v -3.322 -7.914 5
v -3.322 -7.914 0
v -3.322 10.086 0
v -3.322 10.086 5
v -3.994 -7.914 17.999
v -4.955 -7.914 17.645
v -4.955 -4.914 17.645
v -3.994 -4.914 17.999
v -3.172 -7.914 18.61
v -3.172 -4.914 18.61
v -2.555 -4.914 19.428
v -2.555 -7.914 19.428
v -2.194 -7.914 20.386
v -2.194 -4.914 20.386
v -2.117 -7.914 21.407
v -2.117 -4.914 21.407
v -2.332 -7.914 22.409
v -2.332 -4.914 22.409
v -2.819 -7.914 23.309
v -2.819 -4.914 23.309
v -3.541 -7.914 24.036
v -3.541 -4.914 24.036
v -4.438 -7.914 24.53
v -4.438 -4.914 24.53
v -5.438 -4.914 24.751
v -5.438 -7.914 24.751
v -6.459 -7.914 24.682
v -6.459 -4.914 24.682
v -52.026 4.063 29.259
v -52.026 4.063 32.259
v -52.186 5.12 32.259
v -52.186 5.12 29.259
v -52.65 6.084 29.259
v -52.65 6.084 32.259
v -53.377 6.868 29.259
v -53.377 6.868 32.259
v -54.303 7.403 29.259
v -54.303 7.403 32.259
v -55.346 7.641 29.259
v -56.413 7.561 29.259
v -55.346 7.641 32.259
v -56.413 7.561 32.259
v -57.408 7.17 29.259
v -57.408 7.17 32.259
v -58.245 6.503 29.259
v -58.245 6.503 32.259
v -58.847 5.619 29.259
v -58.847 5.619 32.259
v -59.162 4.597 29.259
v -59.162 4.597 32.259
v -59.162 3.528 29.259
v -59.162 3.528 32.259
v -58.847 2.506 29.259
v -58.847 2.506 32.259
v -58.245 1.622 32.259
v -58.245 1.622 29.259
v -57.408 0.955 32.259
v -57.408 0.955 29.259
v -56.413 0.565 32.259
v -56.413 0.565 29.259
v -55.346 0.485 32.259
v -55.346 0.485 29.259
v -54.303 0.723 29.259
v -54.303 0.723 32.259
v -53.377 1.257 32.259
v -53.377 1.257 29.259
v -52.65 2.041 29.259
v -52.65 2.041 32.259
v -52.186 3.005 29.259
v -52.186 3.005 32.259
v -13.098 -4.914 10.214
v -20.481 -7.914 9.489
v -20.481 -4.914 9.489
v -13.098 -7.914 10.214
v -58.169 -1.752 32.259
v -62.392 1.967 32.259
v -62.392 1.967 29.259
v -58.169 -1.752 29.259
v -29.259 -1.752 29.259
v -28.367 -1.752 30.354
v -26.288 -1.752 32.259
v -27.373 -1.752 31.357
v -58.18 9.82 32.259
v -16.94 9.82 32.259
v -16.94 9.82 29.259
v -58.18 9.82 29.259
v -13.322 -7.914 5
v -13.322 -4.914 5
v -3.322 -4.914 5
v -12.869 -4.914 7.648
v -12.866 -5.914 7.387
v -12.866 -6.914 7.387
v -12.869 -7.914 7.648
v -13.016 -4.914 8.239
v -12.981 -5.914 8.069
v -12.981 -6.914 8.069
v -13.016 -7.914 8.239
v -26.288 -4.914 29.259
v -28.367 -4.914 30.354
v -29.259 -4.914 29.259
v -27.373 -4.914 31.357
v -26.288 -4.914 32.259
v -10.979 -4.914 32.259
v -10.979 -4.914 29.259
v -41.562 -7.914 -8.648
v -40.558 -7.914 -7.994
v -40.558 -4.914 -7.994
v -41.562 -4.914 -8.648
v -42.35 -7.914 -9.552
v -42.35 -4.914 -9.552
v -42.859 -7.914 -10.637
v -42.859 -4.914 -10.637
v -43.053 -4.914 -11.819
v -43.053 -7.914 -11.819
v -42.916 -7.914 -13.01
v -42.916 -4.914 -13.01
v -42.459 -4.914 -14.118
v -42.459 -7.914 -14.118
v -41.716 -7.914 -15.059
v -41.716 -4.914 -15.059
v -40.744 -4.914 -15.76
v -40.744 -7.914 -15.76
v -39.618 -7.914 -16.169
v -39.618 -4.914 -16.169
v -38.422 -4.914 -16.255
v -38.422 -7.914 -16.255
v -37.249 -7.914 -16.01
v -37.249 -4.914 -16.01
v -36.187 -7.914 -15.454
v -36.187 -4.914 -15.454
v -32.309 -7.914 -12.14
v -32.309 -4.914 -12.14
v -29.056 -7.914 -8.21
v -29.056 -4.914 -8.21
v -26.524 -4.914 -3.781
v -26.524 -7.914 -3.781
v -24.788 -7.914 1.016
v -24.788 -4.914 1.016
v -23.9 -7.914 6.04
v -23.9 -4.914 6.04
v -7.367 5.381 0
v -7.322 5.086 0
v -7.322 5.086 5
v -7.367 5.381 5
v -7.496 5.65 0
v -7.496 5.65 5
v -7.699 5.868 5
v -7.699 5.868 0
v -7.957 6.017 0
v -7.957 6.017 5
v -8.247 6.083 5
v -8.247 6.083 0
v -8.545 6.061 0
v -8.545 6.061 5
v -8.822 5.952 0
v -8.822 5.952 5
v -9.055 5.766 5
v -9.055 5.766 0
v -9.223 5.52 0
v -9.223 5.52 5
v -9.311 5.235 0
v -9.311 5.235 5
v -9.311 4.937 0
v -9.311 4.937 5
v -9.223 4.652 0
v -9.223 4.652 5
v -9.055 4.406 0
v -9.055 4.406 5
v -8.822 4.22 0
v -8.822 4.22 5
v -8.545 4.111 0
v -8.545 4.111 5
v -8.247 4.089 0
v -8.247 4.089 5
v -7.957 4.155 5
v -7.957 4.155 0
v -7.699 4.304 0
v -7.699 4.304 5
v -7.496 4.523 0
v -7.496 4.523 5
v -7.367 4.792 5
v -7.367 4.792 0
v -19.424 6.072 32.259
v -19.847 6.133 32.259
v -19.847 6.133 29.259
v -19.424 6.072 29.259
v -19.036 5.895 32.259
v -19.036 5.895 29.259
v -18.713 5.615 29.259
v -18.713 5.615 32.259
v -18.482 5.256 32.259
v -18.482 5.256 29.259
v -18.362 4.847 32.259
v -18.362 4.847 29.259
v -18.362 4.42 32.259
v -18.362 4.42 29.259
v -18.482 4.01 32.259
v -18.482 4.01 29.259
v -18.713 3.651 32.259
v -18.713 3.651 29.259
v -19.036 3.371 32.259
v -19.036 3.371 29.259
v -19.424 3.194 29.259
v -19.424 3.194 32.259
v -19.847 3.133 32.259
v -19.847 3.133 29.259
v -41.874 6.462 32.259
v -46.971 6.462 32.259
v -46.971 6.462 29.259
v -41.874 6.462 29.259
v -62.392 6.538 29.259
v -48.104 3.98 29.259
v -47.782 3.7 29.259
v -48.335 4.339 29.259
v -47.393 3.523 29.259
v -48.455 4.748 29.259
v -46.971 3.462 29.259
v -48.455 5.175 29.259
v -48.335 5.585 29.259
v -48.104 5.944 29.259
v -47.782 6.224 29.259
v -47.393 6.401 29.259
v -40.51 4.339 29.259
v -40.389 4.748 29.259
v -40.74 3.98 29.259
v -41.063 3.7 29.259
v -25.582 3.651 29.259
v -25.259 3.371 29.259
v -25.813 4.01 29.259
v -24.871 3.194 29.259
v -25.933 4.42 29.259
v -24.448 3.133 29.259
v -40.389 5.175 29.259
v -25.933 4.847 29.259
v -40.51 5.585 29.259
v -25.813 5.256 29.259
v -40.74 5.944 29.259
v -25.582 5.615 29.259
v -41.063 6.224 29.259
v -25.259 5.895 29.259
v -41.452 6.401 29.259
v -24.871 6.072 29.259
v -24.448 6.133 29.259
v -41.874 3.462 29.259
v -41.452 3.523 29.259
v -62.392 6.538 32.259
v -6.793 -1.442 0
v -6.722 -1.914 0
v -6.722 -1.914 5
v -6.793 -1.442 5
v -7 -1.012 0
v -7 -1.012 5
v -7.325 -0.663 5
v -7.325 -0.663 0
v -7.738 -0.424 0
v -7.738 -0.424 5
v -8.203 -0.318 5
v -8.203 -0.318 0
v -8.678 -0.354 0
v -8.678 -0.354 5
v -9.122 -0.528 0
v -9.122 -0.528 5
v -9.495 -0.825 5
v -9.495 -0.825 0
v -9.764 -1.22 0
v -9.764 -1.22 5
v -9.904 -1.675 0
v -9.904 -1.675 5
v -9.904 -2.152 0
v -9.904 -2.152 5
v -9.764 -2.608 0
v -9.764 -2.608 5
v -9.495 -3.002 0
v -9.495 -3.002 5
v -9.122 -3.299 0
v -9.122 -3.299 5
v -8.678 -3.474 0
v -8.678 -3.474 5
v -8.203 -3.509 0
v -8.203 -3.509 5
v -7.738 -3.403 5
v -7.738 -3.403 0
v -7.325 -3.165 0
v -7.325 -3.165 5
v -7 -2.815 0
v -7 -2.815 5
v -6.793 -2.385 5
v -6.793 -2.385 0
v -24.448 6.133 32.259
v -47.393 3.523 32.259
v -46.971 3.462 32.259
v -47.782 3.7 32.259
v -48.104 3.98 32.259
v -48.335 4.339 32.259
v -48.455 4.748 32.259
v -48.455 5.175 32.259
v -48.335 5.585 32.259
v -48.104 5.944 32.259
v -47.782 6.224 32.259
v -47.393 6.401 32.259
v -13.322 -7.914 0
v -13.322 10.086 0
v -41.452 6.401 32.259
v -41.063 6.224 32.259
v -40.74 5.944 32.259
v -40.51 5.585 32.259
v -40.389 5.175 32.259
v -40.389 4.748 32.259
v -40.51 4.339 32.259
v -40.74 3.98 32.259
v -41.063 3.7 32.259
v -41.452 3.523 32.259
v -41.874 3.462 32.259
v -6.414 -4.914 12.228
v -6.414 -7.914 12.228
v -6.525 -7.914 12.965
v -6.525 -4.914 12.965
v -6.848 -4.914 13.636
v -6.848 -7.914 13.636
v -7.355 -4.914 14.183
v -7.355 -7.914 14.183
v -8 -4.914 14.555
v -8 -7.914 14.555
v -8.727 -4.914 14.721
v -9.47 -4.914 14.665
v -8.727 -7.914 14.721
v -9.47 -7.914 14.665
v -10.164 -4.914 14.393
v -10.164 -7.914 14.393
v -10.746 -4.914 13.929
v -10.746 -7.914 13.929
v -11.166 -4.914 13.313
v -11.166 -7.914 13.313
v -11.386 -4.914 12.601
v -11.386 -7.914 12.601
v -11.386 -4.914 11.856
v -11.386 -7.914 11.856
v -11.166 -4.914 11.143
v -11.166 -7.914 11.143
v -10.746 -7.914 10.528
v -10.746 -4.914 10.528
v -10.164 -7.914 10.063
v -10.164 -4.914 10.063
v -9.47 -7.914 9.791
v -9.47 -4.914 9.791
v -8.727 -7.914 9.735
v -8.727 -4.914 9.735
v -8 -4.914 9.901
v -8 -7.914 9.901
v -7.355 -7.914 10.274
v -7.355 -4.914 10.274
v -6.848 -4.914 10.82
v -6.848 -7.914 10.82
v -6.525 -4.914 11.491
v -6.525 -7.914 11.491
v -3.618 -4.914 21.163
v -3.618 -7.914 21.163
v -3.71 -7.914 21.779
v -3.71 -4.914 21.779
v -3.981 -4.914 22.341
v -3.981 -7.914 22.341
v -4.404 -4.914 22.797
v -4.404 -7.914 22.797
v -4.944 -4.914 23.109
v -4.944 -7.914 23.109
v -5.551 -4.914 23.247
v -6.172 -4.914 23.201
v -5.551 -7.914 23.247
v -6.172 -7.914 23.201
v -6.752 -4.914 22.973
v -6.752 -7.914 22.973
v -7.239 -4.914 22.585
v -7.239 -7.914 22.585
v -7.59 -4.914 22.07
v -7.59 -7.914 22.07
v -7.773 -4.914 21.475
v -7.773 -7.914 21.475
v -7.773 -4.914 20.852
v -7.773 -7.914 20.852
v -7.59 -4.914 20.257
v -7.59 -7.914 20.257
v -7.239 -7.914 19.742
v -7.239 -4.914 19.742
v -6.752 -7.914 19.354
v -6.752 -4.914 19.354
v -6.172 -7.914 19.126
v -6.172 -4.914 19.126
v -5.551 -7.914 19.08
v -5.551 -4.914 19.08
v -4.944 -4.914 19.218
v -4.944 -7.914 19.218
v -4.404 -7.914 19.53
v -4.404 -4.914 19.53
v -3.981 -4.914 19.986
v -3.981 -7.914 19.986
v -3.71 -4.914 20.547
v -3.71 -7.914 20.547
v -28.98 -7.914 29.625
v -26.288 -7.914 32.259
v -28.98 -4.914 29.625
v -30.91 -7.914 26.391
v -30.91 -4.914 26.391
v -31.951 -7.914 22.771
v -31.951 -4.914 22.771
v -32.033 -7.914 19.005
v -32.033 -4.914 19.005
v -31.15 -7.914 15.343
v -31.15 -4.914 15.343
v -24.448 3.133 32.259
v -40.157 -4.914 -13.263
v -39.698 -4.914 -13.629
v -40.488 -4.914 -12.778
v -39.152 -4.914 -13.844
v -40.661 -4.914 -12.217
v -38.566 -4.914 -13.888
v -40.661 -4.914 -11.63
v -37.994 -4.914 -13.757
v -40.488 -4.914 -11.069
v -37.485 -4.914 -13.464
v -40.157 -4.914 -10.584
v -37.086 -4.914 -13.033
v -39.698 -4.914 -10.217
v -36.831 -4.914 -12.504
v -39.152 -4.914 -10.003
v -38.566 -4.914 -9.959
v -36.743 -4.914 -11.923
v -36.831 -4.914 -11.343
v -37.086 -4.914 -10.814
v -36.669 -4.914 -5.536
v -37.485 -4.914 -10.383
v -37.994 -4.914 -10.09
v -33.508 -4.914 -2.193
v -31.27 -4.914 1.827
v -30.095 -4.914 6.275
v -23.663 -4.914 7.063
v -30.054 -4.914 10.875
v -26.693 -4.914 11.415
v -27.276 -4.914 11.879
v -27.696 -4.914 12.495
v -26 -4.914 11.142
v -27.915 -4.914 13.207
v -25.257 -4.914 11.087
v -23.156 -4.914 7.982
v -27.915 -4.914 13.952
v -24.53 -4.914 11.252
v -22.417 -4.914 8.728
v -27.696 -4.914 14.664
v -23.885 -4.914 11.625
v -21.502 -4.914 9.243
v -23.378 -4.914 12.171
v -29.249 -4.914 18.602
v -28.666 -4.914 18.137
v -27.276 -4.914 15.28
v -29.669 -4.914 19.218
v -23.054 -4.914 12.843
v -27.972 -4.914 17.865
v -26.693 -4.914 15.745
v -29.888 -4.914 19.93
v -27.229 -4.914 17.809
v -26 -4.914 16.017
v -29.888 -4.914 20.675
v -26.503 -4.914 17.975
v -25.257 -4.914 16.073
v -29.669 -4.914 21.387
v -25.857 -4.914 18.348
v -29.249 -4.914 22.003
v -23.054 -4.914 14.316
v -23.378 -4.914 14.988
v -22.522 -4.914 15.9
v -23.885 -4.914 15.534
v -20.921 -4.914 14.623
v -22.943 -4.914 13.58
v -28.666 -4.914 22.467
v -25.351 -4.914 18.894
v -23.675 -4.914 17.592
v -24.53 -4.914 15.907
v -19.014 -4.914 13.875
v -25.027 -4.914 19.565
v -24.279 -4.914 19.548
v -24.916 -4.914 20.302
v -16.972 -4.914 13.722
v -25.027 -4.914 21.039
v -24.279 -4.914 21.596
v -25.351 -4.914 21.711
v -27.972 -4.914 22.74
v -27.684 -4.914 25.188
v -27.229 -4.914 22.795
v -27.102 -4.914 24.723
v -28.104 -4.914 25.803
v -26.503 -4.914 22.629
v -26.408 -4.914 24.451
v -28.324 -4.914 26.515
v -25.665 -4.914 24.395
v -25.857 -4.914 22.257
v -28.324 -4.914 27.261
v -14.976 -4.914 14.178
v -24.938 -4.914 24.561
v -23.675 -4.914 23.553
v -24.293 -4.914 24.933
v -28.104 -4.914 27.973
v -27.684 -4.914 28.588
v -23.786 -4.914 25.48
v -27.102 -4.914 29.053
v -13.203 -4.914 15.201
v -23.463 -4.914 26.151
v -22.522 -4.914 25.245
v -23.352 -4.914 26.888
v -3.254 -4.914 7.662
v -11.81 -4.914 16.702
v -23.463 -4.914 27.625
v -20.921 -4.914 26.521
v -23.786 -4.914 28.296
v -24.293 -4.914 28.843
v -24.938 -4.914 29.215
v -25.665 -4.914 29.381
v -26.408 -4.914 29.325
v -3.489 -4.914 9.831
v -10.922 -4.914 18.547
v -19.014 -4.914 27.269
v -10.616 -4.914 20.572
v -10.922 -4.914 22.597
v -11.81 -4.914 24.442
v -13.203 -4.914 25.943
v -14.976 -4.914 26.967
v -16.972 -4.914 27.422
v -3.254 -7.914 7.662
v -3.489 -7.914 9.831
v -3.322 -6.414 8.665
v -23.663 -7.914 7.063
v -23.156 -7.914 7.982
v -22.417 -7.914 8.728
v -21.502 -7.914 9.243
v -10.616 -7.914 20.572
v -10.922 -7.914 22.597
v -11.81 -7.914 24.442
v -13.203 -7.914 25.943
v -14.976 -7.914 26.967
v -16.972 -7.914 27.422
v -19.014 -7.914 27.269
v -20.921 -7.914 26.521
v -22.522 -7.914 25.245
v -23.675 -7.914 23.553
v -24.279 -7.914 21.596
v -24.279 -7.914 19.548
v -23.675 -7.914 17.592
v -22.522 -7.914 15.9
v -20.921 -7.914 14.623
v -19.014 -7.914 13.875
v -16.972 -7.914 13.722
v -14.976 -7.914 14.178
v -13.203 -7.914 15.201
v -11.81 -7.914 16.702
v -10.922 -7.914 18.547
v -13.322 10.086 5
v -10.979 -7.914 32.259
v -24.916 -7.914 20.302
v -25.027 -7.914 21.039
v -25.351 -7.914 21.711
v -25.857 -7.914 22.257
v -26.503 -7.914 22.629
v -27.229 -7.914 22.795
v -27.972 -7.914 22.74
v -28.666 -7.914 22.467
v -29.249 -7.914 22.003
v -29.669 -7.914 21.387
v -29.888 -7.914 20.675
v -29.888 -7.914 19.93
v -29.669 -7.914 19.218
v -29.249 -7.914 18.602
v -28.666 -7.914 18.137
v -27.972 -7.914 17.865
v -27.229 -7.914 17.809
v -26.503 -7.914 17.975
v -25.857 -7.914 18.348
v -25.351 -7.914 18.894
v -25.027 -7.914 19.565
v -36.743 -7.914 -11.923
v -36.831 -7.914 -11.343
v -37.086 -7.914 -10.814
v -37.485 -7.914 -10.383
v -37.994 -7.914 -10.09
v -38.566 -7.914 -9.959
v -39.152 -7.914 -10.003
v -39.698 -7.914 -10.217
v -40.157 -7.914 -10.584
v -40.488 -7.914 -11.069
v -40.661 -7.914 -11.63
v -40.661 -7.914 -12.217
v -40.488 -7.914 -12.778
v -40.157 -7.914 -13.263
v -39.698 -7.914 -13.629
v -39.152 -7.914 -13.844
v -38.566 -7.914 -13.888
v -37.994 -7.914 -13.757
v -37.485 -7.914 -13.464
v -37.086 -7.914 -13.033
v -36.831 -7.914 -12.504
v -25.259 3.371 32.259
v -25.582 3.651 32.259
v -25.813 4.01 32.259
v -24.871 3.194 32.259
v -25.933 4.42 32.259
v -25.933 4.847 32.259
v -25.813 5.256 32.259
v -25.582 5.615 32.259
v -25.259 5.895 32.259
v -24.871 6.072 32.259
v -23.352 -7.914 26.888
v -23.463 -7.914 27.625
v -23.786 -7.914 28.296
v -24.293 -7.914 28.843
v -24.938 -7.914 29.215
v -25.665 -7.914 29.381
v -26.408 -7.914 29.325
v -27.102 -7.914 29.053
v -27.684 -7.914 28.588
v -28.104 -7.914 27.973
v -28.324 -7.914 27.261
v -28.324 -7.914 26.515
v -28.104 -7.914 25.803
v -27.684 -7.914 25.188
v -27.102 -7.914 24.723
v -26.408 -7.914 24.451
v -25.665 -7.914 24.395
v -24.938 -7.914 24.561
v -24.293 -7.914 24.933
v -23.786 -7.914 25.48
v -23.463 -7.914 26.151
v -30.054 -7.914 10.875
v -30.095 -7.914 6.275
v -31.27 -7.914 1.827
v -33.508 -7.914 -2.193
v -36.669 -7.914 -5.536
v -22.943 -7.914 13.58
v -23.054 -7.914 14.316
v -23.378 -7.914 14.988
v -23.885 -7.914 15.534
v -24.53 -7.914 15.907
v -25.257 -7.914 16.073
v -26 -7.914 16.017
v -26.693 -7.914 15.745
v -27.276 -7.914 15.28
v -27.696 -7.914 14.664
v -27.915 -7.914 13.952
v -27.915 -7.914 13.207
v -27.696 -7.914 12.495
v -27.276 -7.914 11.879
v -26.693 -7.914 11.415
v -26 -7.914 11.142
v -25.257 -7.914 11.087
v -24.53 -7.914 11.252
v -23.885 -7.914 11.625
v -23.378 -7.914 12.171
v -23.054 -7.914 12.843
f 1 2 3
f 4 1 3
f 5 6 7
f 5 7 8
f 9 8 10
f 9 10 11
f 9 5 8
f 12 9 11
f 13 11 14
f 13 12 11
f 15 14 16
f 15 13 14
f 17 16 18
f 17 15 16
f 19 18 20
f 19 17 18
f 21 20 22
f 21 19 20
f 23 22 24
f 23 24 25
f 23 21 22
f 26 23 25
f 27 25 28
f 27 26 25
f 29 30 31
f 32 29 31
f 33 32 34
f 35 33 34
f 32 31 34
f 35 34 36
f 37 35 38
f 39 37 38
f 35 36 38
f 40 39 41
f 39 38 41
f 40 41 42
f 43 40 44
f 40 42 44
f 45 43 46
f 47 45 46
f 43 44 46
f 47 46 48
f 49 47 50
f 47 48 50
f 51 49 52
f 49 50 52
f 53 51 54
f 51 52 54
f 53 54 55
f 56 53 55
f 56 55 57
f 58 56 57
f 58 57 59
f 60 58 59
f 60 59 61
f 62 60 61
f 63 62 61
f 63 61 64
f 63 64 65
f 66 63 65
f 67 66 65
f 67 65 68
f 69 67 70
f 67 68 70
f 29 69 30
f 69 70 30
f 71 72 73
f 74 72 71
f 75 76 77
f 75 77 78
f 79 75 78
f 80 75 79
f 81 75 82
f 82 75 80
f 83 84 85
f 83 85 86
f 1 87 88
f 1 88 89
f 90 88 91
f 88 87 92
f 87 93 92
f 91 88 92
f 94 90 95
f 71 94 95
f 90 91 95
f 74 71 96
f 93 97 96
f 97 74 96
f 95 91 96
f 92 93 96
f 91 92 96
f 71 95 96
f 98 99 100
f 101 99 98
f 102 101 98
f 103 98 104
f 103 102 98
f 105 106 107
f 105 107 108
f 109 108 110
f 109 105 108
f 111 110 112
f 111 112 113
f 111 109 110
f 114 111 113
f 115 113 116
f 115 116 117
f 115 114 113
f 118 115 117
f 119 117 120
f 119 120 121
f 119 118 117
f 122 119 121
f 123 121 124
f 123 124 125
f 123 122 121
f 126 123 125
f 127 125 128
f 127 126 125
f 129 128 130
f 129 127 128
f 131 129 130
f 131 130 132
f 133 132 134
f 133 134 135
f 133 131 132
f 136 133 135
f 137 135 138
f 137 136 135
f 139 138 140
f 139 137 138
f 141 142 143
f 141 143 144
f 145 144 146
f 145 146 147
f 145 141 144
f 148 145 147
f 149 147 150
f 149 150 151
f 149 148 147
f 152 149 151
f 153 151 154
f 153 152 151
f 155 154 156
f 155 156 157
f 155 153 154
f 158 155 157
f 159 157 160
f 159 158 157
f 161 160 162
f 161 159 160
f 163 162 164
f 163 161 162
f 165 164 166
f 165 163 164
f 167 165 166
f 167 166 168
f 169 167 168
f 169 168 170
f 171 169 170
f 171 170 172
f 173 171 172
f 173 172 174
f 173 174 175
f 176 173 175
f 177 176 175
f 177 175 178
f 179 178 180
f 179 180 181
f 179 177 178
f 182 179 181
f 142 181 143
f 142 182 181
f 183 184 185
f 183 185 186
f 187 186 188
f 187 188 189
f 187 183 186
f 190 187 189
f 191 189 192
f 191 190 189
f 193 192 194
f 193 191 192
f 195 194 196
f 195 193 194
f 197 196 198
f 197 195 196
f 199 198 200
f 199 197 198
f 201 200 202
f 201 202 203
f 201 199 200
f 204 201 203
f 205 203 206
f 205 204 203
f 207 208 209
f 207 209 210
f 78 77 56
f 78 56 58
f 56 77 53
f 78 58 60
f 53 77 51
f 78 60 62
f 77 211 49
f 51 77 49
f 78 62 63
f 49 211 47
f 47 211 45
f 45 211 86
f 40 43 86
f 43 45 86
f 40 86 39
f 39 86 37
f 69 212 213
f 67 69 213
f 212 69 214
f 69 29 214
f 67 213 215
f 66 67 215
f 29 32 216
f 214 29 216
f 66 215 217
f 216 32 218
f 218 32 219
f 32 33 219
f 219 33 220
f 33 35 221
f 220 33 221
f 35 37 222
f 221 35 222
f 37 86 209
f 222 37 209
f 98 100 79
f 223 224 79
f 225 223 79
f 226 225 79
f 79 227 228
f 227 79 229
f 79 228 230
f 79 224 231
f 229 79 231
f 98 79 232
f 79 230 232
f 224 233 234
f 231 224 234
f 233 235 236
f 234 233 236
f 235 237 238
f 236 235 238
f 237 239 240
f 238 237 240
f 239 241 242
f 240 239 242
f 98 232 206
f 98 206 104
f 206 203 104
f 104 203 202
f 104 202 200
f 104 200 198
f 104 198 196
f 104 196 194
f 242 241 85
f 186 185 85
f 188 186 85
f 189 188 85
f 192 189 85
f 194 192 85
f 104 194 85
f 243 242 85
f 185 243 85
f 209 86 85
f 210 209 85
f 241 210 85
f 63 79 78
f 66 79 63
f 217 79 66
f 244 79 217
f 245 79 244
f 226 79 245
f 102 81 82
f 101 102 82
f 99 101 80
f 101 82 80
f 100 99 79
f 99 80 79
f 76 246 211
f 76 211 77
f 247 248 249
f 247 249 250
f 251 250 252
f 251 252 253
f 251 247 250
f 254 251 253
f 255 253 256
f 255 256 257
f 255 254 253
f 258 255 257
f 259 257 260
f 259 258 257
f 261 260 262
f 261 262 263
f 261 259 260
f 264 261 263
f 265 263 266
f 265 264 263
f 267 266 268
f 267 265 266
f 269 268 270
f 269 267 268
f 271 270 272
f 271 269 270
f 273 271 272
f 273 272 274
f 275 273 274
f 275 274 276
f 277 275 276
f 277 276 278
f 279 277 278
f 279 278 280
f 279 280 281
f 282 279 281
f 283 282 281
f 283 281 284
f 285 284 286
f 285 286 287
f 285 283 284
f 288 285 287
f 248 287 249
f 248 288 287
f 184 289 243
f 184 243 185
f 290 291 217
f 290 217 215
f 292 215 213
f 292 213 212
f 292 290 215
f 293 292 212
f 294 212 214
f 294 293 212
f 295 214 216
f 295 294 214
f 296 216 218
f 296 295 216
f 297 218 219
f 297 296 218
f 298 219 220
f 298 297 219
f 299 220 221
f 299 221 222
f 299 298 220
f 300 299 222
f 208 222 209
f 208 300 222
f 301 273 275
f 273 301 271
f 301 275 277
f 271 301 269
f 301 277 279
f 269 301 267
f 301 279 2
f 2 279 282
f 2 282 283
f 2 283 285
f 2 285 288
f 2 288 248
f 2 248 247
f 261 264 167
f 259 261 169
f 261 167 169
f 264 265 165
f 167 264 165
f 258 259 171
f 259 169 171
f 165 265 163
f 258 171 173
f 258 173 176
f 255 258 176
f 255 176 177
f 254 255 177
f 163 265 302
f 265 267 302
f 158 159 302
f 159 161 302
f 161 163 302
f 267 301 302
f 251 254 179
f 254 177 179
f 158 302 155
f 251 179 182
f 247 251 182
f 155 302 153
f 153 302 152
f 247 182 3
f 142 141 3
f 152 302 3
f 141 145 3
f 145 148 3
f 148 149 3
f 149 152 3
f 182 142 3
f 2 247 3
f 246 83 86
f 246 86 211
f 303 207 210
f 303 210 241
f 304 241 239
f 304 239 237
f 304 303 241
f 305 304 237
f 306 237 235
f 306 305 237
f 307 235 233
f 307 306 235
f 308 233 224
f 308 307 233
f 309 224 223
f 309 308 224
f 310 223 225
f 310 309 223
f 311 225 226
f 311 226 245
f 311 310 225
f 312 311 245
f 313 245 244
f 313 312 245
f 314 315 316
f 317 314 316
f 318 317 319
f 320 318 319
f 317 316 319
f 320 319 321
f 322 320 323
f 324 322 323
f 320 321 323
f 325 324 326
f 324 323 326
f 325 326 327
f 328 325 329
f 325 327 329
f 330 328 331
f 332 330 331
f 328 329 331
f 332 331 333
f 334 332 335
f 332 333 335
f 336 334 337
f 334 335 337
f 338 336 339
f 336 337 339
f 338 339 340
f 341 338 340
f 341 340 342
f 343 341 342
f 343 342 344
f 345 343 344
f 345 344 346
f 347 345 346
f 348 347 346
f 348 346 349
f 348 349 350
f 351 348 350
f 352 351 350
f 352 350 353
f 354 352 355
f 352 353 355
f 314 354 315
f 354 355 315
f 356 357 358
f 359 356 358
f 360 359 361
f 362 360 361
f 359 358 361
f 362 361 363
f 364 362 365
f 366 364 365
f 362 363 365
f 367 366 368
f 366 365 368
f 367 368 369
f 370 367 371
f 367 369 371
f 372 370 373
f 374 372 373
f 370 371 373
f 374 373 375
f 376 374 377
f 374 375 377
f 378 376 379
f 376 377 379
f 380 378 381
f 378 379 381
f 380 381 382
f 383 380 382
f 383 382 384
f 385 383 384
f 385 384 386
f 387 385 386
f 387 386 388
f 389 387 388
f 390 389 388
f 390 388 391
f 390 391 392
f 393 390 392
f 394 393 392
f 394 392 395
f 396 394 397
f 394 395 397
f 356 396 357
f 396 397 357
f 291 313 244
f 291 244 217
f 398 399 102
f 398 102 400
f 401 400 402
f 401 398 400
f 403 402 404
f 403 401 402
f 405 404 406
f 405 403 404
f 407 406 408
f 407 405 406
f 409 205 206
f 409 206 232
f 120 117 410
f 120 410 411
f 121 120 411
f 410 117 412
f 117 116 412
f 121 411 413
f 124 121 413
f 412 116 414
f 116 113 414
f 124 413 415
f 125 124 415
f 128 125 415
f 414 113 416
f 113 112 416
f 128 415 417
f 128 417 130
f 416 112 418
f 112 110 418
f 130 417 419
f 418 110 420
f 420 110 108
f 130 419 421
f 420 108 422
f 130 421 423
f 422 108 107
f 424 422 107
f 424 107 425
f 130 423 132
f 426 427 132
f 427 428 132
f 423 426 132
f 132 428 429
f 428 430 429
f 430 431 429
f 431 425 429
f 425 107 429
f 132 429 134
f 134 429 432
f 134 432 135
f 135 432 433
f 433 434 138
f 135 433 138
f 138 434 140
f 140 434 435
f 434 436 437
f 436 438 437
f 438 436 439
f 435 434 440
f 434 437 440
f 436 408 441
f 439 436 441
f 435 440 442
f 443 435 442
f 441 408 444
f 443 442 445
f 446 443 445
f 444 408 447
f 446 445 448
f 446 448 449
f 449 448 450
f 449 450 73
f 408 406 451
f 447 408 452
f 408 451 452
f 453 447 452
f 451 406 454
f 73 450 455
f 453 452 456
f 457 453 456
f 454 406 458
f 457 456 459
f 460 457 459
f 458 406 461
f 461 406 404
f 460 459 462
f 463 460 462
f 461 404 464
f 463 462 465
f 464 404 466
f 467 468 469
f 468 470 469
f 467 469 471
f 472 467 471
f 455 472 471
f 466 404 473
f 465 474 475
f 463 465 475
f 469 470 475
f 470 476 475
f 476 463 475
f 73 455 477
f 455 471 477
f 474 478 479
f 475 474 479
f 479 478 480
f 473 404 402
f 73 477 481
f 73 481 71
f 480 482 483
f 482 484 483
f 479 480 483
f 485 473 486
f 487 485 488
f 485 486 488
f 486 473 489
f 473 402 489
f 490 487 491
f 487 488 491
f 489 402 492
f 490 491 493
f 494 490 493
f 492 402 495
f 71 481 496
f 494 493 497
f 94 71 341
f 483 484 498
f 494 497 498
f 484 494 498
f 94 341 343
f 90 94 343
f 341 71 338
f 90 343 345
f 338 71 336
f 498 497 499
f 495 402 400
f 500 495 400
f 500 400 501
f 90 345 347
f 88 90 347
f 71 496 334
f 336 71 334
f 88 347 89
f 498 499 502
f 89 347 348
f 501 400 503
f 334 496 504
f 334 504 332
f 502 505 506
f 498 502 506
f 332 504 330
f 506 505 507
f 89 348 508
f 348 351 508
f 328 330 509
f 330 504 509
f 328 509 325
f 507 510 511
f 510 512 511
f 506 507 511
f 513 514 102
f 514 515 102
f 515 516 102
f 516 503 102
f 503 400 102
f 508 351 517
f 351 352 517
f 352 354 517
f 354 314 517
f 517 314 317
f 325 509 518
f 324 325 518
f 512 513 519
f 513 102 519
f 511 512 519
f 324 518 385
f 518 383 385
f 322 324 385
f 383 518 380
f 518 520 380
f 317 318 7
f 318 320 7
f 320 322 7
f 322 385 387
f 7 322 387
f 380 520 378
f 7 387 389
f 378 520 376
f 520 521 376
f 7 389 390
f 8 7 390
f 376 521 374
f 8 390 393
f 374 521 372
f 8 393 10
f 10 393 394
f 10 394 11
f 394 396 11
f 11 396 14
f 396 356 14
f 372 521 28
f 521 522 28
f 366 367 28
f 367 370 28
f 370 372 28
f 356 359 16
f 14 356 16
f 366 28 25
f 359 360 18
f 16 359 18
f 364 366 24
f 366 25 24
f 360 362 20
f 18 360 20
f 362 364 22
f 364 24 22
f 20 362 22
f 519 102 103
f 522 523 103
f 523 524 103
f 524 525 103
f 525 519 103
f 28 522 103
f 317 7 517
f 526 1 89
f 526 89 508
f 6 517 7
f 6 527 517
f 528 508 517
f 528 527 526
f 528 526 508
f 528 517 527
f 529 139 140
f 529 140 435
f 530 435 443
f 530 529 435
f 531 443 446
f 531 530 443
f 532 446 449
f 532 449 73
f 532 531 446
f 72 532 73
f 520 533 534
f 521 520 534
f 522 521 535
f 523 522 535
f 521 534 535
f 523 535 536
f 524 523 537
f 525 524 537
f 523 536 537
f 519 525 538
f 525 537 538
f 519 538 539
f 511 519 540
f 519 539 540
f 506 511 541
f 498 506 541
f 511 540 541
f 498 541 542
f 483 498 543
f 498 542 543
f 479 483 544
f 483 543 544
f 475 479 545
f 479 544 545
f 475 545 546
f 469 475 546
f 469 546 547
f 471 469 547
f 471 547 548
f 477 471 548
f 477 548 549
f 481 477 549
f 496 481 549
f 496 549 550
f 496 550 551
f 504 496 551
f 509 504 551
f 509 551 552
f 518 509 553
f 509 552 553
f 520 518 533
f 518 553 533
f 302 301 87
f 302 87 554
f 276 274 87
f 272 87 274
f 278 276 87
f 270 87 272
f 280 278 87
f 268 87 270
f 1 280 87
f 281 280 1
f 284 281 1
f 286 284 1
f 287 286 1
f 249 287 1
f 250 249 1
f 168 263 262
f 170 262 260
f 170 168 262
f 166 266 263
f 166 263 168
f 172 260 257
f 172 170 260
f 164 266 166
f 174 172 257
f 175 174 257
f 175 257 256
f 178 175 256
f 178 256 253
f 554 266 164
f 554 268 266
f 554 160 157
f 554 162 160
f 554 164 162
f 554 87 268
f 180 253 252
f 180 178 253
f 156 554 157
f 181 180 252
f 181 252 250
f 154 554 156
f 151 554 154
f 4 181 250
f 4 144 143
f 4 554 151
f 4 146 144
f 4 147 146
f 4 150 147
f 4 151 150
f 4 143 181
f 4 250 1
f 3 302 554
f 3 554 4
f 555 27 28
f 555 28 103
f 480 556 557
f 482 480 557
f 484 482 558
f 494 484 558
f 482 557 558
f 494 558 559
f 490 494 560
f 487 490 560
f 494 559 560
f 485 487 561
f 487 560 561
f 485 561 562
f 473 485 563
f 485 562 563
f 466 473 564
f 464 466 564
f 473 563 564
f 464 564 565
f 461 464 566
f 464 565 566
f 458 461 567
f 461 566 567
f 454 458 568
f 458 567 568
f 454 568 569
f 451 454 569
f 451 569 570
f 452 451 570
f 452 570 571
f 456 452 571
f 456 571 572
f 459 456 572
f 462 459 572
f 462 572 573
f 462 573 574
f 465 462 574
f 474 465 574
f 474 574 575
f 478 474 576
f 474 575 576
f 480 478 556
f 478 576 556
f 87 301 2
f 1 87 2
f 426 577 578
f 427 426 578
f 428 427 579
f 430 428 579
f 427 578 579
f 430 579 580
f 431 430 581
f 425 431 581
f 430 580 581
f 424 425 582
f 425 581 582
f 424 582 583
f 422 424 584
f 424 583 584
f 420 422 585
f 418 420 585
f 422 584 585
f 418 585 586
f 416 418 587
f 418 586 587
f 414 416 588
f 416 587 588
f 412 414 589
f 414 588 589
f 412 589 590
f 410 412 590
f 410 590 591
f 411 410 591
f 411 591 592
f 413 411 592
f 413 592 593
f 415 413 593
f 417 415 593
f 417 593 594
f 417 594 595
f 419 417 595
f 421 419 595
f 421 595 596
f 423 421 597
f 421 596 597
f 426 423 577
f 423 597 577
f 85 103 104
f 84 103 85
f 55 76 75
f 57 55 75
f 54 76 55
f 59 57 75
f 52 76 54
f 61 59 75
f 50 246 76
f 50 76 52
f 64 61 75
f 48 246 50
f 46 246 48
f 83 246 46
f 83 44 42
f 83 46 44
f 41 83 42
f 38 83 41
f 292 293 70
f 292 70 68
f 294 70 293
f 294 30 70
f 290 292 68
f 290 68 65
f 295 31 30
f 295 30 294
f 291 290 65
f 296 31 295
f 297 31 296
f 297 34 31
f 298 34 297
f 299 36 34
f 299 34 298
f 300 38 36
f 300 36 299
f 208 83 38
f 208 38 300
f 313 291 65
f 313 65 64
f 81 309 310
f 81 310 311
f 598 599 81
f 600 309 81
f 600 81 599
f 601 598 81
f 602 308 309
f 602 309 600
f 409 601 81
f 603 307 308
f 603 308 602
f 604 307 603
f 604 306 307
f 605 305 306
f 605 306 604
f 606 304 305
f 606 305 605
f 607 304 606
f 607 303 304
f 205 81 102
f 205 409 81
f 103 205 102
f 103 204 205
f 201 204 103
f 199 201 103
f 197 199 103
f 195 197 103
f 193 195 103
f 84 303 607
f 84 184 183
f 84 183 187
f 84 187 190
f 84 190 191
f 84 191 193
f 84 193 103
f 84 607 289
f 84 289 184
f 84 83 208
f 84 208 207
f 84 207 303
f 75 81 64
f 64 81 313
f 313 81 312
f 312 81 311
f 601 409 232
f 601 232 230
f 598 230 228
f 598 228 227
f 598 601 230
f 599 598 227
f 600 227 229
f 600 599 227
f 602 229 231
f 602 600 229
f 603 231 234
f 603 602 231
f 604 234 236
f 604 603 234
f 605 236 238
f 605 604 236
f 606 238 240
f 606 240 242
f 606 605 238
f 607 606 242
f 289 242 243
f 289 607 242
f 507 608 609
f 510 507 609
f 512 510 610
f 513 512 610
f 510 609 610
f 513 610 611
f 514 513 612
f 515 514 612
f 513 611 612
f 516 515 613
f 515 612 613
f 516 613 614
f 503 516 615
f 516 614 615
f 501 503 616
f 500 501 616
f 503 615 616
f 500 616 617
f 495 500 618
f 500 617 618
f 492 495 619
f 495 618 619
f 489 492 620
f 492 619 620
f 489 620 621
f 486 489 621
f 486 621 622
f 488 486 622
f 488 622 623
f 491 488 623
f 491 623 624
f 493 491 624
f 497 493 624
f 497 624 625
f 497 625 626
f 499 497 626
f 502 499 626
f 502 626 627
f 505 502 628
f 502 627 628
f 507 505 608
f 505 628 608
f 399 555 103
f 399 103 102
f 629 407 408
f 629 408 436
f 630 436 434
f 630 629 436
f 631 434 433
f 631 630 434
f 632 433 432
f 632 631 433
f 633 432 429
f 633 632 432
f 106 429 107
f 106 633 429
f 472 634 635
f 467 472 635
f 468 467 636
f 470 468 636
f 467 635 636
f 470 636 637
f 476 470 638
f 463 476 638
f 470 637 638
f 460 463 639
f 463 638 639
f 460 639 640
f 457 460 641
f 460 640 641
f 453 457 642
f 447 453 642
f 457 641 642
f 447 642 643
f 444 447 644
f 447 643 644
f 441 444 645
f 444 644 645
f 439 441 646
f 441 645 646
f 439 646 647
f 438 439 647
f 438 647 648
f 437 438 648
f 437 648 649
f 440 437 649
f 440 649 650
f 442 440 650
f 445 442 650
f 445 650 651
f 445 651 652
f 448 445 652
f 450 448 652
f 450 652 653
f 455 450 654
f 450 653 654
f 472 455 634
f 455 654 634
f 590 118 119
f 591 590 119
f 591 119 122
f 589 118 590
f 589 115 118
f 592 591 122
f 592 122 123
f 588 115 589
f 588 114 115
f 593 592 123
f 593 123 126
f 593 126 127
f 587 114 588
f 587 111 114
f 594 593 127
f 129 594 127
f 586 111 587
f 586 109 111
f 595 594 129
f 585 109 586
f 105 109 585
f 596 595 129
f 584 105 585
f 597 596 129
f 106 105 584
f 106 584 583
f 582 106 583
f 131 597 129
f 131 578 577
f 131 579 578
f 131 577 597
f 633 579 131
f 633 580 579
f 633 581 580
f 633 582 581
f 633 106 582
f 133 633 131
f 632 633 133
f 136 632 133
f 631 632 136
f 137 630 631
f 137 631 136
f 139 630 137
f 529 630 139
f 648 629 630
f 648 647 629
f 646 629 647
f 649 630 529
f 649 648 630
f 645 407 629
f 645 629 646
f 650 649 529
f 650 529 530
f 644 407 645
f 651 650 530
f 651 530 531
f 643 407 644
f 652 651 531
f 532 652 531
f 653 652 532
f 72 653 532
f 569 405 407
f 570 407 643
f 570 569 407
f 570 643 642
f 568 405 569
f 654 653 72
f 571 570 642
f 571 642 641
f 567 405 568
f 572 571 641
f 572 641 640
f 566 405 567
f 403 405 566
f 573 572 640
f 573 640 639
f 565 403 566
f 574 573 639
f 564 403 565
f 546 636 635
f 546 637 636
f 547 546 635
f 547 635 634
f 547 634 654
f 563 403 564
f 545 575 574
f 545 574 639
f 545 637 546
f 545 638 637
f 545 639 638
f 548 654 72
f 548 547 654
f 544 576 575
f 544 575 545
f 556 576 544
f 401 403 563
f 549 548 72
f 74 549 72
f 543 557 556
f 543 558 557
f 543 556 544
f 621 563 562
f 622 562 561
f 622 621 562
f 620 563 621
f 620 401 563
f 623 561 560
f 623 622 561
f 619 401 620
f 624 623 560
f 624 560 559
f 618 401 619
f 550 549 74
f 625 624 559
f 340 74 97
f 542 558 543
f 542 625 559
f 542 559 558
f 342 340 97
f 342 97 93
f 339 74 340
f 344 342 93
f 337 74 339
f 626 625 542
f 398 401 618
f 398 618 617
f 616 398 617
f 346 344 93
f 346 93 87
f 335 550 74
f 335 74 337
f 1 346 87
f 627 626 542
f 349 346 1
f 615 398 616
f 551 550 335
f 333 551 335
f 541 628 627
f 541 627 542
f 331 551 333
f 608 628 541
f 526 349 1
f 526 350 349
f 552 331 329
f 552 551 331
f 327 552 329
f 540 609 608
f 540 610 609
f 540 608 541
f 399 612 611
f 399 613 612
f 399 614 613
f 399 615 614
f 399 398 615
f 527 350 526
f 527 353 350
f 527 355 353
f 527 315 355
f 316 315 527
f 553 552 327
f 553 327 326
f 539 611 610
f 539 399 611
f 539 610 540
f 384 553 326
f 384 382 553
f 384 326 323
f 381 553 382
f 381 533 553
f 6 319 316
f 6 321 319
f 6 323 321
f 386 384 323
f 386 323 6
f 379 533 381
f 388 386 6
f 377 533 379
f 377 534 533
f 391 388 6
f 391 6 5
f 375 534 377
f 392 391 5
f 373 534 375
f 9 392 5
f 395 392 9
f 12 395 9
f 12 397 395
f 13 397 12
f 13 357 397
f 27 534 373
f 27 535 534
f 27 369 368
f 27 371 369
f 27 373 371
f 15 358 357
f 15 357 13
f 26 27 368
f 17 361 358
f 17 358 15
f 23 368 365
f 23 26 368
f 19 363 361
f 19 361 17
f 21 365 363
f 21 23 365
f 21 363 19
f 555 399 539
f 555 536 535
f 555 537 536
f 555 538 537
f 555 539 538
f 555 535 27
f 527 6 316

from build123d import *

# Parameters (mm, degrees)
F0_W     = 10
F0_H     = 18
F0_R     = 1.6
F0_R_2   = 1
F1_DEPTH = 5
F2_R     = 1.9699121269
F2_R_2   = 2.5
F2_R_3   = 6.869499788
F2_R_4   = 2.0896484604
F3_DEPTH = 3
F4_R     = 3.5880472774
F5_DEPTH = 3
F7_DEPTH = 3.1614936367


with BuildPart() as f1:
    # F0 (on Top) → F1 (new body)
    with BuildSketch(Plane.XY):
        with Locations((-8.3221568636, 1.0862629861)):
            Rectangle(F0_W, F0_H)
        with Locations((-8.3221568636, -1.9137370139)):
            Circle(F0_R, mode=Mode.SUBTRACT)
        with Locations((-8.3221568636, 5.0862629861)):
            Circle(F0_R_2, mode=Mode.SUBTRACT)
    extrude(amount=F1_DEPTH)


with BuildPart() as f3:
    # F2 (on face) → F3 (new body)
    with BuildSketch(Plane.XZ.offset(7.9137370139)):
        with BuildLine():
            Line((-13.3221568636, 5), (-3.3221568636, 5))
            add(Edge.make_bspline(
                [(-3.3221568636, 5), (-3.2552653311, 6.0908019939), (-3.0746854072, 9.342919926), (-4.269755775, 12.9369020162), (-4.9549108371, 17.6448374987)],
                knots=[0, 0, 0, 0, 0.3878947266, 1, 1, 1, 1], degree=3))
            ThreePointArc((-4.9549108371, 17.6448374987), (-2.1886315475, 21.9156040845), (-6.4593981333, 24.6818833741))
            Line((-6.4593981333, 24.6818833741), (-10.9792040735, 32.2593962774))
            Line((-10.9792040735, 32.2593962774), (-26.2877818286, 32.2593962774))
            ThreePointArc((-26.2877818286, 32.2593962774), (-31.547377506, 24.6142485357), (-31.1504669753, 15.3431055256))
            ThreePointArc((-31.1504669753, 15.3431055256), (-31.2702316577, 1.826680677), (-40.5582249678, -7.9937706638))
            ThreePointArc((-40.5582249678, -7.9937706638), (-42.4590174037, -14.1180551679), (-36.1872349298, -15.4539508117))
            ThreePointArc((-36.1872349298, -15.4539508117), (-27.6944192034, -6.0499089443), (-23.8997744182, 6.0399460324))
            ThreePointArc((-23.8997744182, 6.0399460324), (-22.8122929978, 8.3806310483), (-20.4814388049, 9.4890266975))
            Line((-20.4814388049, 9.4890266975), (-13.098238966, 10.2140815927))
            add(Edge.make_bspline(
                [(-13.3221568636, 5), (-12.3911872602, 9.2965995769), (-13.1695237687, 6.2813326191), (-13.098238966, 10.2140815927)],
                knots=[0, 0, 0, 0, 5.2188874371, 5.2188874371, 5.2188874371, 5.2188874371], degree=3))
        make_face()
        with Locations((-38.7134026542, -11.9234640947)):
            Circle(F2_R, mode=Mode.SUBTRACT)
        with Locations((-25.4434074495, 13.5795854718)):
            Circle(F2_R_2, mode=Mode.SUBTRACT)
        with Locations((-27.4161801418, 20.3022349277)):
            Circle(F2_R_2, mode=Mode.SUBTRACT)
        with Locations((-25.8515487019, 26.8880009391)):
            Circle(F2_R_2, mode=Mode.SUBTRACT)
        with Locations((-8.913740901, 12.2281657972)):
            Circle(F2_R_2, mode=Mode.SUBTRACT)
        with Locations((-17.4858285757, 20.5721753575)):
            Circle(F2_R_3, mode=Mode.SUBTRACT)
        with Locations((-5.7071544852, 21.1633604364)):
            Circle(F2_R_4, mode=Mode.SUBTRACT)
    extrude(amount=-F3_DEPTH)


with BuildPart() as f5:
    # F4 (on face) → F5 (new body)
    with BuildSketch(Plane.XY.offset(32.2593962774)):
        Polygon((-26.2877818286, -4.9137370139), (-10.9792040735, -4.9137370139), (-16.9395767152, 9.8199117929), (-58.1803768873, 9.8199117929), (-62.392167747, 6.5383897163), (-62.392167747, 1.9674218294), (-58.1693314016, -1.7522433773), (-26.2043997645, -1.7522433773), align=None)
        with Locations((-55.6143447757, 4.0625985712)):
            Circle(F4_R, mode=Mode.SUBTRACT)
        with BuildLine():
            Line((-46.9706878066, 6.4617942423), (-41.8741069734, 6.4617942423))
            ThreePointArc((-41.8741069734, 6.4617942423), (-40.3741069734, 4.9617942423), (-41.8741069734, 3.4617942423))
            Line((-41.8741069734, 3.4617942423), (-46.9706878066, 3.4617942423))
            ThreePointArc((-46.9706878066, 3.4617942423), (-48.4706878066, 4.9617942423), (-46.9706878066, 6.4617942423))
        make_face(mode=Mode.SUBTRACT)
        with BuildLine():
            Line((-24.4482420385, 6.1331547201), (-19.8469385505, 6.1331547201))
            ThreePointArc((-19.8469385505, 6.1331547201), (-18.3469385505, 4.6331547201), (-19.8469385505, 3.1331547201))
            Line((-19.8469385505, 3.1331547201), (-24.4482420385, 3.1331547201))
            ThreePointArc((-24.4482420385, 3.1331547201), (-25.9482420385, 4.6331547201), (-24.4482420385, 6.1331547201))
        make_face(mode=Mode.SUBTRACT)
    extrude(amount=-F5_DEPTH)

    # F6 (on face) → F7 (join, through all)
    with BuildSketch(Plane.XZ.offset(1.7522433773)):
        with BuildLine():
            Line((-26.2043997645, 32.2593962774), (-26.2877818286, 32.2593962774))
            ThreePointArc((-26.2877818286, 32.2593962774), (-27.8819639855, 30.8671198662), (-29.2585812948, 29.2593962774))
            Line((-29.2585812948, 29.2593962774), (-26.2043997645, 29.2593962774))
            Line((-26.2043997645, 29.2593962774), (-26.2043997645, 32.2593962774))
        make_face()
    extrude(amount=F7_DEPTH)


solid = Compound([f1.part, f3.part, f5.part])
